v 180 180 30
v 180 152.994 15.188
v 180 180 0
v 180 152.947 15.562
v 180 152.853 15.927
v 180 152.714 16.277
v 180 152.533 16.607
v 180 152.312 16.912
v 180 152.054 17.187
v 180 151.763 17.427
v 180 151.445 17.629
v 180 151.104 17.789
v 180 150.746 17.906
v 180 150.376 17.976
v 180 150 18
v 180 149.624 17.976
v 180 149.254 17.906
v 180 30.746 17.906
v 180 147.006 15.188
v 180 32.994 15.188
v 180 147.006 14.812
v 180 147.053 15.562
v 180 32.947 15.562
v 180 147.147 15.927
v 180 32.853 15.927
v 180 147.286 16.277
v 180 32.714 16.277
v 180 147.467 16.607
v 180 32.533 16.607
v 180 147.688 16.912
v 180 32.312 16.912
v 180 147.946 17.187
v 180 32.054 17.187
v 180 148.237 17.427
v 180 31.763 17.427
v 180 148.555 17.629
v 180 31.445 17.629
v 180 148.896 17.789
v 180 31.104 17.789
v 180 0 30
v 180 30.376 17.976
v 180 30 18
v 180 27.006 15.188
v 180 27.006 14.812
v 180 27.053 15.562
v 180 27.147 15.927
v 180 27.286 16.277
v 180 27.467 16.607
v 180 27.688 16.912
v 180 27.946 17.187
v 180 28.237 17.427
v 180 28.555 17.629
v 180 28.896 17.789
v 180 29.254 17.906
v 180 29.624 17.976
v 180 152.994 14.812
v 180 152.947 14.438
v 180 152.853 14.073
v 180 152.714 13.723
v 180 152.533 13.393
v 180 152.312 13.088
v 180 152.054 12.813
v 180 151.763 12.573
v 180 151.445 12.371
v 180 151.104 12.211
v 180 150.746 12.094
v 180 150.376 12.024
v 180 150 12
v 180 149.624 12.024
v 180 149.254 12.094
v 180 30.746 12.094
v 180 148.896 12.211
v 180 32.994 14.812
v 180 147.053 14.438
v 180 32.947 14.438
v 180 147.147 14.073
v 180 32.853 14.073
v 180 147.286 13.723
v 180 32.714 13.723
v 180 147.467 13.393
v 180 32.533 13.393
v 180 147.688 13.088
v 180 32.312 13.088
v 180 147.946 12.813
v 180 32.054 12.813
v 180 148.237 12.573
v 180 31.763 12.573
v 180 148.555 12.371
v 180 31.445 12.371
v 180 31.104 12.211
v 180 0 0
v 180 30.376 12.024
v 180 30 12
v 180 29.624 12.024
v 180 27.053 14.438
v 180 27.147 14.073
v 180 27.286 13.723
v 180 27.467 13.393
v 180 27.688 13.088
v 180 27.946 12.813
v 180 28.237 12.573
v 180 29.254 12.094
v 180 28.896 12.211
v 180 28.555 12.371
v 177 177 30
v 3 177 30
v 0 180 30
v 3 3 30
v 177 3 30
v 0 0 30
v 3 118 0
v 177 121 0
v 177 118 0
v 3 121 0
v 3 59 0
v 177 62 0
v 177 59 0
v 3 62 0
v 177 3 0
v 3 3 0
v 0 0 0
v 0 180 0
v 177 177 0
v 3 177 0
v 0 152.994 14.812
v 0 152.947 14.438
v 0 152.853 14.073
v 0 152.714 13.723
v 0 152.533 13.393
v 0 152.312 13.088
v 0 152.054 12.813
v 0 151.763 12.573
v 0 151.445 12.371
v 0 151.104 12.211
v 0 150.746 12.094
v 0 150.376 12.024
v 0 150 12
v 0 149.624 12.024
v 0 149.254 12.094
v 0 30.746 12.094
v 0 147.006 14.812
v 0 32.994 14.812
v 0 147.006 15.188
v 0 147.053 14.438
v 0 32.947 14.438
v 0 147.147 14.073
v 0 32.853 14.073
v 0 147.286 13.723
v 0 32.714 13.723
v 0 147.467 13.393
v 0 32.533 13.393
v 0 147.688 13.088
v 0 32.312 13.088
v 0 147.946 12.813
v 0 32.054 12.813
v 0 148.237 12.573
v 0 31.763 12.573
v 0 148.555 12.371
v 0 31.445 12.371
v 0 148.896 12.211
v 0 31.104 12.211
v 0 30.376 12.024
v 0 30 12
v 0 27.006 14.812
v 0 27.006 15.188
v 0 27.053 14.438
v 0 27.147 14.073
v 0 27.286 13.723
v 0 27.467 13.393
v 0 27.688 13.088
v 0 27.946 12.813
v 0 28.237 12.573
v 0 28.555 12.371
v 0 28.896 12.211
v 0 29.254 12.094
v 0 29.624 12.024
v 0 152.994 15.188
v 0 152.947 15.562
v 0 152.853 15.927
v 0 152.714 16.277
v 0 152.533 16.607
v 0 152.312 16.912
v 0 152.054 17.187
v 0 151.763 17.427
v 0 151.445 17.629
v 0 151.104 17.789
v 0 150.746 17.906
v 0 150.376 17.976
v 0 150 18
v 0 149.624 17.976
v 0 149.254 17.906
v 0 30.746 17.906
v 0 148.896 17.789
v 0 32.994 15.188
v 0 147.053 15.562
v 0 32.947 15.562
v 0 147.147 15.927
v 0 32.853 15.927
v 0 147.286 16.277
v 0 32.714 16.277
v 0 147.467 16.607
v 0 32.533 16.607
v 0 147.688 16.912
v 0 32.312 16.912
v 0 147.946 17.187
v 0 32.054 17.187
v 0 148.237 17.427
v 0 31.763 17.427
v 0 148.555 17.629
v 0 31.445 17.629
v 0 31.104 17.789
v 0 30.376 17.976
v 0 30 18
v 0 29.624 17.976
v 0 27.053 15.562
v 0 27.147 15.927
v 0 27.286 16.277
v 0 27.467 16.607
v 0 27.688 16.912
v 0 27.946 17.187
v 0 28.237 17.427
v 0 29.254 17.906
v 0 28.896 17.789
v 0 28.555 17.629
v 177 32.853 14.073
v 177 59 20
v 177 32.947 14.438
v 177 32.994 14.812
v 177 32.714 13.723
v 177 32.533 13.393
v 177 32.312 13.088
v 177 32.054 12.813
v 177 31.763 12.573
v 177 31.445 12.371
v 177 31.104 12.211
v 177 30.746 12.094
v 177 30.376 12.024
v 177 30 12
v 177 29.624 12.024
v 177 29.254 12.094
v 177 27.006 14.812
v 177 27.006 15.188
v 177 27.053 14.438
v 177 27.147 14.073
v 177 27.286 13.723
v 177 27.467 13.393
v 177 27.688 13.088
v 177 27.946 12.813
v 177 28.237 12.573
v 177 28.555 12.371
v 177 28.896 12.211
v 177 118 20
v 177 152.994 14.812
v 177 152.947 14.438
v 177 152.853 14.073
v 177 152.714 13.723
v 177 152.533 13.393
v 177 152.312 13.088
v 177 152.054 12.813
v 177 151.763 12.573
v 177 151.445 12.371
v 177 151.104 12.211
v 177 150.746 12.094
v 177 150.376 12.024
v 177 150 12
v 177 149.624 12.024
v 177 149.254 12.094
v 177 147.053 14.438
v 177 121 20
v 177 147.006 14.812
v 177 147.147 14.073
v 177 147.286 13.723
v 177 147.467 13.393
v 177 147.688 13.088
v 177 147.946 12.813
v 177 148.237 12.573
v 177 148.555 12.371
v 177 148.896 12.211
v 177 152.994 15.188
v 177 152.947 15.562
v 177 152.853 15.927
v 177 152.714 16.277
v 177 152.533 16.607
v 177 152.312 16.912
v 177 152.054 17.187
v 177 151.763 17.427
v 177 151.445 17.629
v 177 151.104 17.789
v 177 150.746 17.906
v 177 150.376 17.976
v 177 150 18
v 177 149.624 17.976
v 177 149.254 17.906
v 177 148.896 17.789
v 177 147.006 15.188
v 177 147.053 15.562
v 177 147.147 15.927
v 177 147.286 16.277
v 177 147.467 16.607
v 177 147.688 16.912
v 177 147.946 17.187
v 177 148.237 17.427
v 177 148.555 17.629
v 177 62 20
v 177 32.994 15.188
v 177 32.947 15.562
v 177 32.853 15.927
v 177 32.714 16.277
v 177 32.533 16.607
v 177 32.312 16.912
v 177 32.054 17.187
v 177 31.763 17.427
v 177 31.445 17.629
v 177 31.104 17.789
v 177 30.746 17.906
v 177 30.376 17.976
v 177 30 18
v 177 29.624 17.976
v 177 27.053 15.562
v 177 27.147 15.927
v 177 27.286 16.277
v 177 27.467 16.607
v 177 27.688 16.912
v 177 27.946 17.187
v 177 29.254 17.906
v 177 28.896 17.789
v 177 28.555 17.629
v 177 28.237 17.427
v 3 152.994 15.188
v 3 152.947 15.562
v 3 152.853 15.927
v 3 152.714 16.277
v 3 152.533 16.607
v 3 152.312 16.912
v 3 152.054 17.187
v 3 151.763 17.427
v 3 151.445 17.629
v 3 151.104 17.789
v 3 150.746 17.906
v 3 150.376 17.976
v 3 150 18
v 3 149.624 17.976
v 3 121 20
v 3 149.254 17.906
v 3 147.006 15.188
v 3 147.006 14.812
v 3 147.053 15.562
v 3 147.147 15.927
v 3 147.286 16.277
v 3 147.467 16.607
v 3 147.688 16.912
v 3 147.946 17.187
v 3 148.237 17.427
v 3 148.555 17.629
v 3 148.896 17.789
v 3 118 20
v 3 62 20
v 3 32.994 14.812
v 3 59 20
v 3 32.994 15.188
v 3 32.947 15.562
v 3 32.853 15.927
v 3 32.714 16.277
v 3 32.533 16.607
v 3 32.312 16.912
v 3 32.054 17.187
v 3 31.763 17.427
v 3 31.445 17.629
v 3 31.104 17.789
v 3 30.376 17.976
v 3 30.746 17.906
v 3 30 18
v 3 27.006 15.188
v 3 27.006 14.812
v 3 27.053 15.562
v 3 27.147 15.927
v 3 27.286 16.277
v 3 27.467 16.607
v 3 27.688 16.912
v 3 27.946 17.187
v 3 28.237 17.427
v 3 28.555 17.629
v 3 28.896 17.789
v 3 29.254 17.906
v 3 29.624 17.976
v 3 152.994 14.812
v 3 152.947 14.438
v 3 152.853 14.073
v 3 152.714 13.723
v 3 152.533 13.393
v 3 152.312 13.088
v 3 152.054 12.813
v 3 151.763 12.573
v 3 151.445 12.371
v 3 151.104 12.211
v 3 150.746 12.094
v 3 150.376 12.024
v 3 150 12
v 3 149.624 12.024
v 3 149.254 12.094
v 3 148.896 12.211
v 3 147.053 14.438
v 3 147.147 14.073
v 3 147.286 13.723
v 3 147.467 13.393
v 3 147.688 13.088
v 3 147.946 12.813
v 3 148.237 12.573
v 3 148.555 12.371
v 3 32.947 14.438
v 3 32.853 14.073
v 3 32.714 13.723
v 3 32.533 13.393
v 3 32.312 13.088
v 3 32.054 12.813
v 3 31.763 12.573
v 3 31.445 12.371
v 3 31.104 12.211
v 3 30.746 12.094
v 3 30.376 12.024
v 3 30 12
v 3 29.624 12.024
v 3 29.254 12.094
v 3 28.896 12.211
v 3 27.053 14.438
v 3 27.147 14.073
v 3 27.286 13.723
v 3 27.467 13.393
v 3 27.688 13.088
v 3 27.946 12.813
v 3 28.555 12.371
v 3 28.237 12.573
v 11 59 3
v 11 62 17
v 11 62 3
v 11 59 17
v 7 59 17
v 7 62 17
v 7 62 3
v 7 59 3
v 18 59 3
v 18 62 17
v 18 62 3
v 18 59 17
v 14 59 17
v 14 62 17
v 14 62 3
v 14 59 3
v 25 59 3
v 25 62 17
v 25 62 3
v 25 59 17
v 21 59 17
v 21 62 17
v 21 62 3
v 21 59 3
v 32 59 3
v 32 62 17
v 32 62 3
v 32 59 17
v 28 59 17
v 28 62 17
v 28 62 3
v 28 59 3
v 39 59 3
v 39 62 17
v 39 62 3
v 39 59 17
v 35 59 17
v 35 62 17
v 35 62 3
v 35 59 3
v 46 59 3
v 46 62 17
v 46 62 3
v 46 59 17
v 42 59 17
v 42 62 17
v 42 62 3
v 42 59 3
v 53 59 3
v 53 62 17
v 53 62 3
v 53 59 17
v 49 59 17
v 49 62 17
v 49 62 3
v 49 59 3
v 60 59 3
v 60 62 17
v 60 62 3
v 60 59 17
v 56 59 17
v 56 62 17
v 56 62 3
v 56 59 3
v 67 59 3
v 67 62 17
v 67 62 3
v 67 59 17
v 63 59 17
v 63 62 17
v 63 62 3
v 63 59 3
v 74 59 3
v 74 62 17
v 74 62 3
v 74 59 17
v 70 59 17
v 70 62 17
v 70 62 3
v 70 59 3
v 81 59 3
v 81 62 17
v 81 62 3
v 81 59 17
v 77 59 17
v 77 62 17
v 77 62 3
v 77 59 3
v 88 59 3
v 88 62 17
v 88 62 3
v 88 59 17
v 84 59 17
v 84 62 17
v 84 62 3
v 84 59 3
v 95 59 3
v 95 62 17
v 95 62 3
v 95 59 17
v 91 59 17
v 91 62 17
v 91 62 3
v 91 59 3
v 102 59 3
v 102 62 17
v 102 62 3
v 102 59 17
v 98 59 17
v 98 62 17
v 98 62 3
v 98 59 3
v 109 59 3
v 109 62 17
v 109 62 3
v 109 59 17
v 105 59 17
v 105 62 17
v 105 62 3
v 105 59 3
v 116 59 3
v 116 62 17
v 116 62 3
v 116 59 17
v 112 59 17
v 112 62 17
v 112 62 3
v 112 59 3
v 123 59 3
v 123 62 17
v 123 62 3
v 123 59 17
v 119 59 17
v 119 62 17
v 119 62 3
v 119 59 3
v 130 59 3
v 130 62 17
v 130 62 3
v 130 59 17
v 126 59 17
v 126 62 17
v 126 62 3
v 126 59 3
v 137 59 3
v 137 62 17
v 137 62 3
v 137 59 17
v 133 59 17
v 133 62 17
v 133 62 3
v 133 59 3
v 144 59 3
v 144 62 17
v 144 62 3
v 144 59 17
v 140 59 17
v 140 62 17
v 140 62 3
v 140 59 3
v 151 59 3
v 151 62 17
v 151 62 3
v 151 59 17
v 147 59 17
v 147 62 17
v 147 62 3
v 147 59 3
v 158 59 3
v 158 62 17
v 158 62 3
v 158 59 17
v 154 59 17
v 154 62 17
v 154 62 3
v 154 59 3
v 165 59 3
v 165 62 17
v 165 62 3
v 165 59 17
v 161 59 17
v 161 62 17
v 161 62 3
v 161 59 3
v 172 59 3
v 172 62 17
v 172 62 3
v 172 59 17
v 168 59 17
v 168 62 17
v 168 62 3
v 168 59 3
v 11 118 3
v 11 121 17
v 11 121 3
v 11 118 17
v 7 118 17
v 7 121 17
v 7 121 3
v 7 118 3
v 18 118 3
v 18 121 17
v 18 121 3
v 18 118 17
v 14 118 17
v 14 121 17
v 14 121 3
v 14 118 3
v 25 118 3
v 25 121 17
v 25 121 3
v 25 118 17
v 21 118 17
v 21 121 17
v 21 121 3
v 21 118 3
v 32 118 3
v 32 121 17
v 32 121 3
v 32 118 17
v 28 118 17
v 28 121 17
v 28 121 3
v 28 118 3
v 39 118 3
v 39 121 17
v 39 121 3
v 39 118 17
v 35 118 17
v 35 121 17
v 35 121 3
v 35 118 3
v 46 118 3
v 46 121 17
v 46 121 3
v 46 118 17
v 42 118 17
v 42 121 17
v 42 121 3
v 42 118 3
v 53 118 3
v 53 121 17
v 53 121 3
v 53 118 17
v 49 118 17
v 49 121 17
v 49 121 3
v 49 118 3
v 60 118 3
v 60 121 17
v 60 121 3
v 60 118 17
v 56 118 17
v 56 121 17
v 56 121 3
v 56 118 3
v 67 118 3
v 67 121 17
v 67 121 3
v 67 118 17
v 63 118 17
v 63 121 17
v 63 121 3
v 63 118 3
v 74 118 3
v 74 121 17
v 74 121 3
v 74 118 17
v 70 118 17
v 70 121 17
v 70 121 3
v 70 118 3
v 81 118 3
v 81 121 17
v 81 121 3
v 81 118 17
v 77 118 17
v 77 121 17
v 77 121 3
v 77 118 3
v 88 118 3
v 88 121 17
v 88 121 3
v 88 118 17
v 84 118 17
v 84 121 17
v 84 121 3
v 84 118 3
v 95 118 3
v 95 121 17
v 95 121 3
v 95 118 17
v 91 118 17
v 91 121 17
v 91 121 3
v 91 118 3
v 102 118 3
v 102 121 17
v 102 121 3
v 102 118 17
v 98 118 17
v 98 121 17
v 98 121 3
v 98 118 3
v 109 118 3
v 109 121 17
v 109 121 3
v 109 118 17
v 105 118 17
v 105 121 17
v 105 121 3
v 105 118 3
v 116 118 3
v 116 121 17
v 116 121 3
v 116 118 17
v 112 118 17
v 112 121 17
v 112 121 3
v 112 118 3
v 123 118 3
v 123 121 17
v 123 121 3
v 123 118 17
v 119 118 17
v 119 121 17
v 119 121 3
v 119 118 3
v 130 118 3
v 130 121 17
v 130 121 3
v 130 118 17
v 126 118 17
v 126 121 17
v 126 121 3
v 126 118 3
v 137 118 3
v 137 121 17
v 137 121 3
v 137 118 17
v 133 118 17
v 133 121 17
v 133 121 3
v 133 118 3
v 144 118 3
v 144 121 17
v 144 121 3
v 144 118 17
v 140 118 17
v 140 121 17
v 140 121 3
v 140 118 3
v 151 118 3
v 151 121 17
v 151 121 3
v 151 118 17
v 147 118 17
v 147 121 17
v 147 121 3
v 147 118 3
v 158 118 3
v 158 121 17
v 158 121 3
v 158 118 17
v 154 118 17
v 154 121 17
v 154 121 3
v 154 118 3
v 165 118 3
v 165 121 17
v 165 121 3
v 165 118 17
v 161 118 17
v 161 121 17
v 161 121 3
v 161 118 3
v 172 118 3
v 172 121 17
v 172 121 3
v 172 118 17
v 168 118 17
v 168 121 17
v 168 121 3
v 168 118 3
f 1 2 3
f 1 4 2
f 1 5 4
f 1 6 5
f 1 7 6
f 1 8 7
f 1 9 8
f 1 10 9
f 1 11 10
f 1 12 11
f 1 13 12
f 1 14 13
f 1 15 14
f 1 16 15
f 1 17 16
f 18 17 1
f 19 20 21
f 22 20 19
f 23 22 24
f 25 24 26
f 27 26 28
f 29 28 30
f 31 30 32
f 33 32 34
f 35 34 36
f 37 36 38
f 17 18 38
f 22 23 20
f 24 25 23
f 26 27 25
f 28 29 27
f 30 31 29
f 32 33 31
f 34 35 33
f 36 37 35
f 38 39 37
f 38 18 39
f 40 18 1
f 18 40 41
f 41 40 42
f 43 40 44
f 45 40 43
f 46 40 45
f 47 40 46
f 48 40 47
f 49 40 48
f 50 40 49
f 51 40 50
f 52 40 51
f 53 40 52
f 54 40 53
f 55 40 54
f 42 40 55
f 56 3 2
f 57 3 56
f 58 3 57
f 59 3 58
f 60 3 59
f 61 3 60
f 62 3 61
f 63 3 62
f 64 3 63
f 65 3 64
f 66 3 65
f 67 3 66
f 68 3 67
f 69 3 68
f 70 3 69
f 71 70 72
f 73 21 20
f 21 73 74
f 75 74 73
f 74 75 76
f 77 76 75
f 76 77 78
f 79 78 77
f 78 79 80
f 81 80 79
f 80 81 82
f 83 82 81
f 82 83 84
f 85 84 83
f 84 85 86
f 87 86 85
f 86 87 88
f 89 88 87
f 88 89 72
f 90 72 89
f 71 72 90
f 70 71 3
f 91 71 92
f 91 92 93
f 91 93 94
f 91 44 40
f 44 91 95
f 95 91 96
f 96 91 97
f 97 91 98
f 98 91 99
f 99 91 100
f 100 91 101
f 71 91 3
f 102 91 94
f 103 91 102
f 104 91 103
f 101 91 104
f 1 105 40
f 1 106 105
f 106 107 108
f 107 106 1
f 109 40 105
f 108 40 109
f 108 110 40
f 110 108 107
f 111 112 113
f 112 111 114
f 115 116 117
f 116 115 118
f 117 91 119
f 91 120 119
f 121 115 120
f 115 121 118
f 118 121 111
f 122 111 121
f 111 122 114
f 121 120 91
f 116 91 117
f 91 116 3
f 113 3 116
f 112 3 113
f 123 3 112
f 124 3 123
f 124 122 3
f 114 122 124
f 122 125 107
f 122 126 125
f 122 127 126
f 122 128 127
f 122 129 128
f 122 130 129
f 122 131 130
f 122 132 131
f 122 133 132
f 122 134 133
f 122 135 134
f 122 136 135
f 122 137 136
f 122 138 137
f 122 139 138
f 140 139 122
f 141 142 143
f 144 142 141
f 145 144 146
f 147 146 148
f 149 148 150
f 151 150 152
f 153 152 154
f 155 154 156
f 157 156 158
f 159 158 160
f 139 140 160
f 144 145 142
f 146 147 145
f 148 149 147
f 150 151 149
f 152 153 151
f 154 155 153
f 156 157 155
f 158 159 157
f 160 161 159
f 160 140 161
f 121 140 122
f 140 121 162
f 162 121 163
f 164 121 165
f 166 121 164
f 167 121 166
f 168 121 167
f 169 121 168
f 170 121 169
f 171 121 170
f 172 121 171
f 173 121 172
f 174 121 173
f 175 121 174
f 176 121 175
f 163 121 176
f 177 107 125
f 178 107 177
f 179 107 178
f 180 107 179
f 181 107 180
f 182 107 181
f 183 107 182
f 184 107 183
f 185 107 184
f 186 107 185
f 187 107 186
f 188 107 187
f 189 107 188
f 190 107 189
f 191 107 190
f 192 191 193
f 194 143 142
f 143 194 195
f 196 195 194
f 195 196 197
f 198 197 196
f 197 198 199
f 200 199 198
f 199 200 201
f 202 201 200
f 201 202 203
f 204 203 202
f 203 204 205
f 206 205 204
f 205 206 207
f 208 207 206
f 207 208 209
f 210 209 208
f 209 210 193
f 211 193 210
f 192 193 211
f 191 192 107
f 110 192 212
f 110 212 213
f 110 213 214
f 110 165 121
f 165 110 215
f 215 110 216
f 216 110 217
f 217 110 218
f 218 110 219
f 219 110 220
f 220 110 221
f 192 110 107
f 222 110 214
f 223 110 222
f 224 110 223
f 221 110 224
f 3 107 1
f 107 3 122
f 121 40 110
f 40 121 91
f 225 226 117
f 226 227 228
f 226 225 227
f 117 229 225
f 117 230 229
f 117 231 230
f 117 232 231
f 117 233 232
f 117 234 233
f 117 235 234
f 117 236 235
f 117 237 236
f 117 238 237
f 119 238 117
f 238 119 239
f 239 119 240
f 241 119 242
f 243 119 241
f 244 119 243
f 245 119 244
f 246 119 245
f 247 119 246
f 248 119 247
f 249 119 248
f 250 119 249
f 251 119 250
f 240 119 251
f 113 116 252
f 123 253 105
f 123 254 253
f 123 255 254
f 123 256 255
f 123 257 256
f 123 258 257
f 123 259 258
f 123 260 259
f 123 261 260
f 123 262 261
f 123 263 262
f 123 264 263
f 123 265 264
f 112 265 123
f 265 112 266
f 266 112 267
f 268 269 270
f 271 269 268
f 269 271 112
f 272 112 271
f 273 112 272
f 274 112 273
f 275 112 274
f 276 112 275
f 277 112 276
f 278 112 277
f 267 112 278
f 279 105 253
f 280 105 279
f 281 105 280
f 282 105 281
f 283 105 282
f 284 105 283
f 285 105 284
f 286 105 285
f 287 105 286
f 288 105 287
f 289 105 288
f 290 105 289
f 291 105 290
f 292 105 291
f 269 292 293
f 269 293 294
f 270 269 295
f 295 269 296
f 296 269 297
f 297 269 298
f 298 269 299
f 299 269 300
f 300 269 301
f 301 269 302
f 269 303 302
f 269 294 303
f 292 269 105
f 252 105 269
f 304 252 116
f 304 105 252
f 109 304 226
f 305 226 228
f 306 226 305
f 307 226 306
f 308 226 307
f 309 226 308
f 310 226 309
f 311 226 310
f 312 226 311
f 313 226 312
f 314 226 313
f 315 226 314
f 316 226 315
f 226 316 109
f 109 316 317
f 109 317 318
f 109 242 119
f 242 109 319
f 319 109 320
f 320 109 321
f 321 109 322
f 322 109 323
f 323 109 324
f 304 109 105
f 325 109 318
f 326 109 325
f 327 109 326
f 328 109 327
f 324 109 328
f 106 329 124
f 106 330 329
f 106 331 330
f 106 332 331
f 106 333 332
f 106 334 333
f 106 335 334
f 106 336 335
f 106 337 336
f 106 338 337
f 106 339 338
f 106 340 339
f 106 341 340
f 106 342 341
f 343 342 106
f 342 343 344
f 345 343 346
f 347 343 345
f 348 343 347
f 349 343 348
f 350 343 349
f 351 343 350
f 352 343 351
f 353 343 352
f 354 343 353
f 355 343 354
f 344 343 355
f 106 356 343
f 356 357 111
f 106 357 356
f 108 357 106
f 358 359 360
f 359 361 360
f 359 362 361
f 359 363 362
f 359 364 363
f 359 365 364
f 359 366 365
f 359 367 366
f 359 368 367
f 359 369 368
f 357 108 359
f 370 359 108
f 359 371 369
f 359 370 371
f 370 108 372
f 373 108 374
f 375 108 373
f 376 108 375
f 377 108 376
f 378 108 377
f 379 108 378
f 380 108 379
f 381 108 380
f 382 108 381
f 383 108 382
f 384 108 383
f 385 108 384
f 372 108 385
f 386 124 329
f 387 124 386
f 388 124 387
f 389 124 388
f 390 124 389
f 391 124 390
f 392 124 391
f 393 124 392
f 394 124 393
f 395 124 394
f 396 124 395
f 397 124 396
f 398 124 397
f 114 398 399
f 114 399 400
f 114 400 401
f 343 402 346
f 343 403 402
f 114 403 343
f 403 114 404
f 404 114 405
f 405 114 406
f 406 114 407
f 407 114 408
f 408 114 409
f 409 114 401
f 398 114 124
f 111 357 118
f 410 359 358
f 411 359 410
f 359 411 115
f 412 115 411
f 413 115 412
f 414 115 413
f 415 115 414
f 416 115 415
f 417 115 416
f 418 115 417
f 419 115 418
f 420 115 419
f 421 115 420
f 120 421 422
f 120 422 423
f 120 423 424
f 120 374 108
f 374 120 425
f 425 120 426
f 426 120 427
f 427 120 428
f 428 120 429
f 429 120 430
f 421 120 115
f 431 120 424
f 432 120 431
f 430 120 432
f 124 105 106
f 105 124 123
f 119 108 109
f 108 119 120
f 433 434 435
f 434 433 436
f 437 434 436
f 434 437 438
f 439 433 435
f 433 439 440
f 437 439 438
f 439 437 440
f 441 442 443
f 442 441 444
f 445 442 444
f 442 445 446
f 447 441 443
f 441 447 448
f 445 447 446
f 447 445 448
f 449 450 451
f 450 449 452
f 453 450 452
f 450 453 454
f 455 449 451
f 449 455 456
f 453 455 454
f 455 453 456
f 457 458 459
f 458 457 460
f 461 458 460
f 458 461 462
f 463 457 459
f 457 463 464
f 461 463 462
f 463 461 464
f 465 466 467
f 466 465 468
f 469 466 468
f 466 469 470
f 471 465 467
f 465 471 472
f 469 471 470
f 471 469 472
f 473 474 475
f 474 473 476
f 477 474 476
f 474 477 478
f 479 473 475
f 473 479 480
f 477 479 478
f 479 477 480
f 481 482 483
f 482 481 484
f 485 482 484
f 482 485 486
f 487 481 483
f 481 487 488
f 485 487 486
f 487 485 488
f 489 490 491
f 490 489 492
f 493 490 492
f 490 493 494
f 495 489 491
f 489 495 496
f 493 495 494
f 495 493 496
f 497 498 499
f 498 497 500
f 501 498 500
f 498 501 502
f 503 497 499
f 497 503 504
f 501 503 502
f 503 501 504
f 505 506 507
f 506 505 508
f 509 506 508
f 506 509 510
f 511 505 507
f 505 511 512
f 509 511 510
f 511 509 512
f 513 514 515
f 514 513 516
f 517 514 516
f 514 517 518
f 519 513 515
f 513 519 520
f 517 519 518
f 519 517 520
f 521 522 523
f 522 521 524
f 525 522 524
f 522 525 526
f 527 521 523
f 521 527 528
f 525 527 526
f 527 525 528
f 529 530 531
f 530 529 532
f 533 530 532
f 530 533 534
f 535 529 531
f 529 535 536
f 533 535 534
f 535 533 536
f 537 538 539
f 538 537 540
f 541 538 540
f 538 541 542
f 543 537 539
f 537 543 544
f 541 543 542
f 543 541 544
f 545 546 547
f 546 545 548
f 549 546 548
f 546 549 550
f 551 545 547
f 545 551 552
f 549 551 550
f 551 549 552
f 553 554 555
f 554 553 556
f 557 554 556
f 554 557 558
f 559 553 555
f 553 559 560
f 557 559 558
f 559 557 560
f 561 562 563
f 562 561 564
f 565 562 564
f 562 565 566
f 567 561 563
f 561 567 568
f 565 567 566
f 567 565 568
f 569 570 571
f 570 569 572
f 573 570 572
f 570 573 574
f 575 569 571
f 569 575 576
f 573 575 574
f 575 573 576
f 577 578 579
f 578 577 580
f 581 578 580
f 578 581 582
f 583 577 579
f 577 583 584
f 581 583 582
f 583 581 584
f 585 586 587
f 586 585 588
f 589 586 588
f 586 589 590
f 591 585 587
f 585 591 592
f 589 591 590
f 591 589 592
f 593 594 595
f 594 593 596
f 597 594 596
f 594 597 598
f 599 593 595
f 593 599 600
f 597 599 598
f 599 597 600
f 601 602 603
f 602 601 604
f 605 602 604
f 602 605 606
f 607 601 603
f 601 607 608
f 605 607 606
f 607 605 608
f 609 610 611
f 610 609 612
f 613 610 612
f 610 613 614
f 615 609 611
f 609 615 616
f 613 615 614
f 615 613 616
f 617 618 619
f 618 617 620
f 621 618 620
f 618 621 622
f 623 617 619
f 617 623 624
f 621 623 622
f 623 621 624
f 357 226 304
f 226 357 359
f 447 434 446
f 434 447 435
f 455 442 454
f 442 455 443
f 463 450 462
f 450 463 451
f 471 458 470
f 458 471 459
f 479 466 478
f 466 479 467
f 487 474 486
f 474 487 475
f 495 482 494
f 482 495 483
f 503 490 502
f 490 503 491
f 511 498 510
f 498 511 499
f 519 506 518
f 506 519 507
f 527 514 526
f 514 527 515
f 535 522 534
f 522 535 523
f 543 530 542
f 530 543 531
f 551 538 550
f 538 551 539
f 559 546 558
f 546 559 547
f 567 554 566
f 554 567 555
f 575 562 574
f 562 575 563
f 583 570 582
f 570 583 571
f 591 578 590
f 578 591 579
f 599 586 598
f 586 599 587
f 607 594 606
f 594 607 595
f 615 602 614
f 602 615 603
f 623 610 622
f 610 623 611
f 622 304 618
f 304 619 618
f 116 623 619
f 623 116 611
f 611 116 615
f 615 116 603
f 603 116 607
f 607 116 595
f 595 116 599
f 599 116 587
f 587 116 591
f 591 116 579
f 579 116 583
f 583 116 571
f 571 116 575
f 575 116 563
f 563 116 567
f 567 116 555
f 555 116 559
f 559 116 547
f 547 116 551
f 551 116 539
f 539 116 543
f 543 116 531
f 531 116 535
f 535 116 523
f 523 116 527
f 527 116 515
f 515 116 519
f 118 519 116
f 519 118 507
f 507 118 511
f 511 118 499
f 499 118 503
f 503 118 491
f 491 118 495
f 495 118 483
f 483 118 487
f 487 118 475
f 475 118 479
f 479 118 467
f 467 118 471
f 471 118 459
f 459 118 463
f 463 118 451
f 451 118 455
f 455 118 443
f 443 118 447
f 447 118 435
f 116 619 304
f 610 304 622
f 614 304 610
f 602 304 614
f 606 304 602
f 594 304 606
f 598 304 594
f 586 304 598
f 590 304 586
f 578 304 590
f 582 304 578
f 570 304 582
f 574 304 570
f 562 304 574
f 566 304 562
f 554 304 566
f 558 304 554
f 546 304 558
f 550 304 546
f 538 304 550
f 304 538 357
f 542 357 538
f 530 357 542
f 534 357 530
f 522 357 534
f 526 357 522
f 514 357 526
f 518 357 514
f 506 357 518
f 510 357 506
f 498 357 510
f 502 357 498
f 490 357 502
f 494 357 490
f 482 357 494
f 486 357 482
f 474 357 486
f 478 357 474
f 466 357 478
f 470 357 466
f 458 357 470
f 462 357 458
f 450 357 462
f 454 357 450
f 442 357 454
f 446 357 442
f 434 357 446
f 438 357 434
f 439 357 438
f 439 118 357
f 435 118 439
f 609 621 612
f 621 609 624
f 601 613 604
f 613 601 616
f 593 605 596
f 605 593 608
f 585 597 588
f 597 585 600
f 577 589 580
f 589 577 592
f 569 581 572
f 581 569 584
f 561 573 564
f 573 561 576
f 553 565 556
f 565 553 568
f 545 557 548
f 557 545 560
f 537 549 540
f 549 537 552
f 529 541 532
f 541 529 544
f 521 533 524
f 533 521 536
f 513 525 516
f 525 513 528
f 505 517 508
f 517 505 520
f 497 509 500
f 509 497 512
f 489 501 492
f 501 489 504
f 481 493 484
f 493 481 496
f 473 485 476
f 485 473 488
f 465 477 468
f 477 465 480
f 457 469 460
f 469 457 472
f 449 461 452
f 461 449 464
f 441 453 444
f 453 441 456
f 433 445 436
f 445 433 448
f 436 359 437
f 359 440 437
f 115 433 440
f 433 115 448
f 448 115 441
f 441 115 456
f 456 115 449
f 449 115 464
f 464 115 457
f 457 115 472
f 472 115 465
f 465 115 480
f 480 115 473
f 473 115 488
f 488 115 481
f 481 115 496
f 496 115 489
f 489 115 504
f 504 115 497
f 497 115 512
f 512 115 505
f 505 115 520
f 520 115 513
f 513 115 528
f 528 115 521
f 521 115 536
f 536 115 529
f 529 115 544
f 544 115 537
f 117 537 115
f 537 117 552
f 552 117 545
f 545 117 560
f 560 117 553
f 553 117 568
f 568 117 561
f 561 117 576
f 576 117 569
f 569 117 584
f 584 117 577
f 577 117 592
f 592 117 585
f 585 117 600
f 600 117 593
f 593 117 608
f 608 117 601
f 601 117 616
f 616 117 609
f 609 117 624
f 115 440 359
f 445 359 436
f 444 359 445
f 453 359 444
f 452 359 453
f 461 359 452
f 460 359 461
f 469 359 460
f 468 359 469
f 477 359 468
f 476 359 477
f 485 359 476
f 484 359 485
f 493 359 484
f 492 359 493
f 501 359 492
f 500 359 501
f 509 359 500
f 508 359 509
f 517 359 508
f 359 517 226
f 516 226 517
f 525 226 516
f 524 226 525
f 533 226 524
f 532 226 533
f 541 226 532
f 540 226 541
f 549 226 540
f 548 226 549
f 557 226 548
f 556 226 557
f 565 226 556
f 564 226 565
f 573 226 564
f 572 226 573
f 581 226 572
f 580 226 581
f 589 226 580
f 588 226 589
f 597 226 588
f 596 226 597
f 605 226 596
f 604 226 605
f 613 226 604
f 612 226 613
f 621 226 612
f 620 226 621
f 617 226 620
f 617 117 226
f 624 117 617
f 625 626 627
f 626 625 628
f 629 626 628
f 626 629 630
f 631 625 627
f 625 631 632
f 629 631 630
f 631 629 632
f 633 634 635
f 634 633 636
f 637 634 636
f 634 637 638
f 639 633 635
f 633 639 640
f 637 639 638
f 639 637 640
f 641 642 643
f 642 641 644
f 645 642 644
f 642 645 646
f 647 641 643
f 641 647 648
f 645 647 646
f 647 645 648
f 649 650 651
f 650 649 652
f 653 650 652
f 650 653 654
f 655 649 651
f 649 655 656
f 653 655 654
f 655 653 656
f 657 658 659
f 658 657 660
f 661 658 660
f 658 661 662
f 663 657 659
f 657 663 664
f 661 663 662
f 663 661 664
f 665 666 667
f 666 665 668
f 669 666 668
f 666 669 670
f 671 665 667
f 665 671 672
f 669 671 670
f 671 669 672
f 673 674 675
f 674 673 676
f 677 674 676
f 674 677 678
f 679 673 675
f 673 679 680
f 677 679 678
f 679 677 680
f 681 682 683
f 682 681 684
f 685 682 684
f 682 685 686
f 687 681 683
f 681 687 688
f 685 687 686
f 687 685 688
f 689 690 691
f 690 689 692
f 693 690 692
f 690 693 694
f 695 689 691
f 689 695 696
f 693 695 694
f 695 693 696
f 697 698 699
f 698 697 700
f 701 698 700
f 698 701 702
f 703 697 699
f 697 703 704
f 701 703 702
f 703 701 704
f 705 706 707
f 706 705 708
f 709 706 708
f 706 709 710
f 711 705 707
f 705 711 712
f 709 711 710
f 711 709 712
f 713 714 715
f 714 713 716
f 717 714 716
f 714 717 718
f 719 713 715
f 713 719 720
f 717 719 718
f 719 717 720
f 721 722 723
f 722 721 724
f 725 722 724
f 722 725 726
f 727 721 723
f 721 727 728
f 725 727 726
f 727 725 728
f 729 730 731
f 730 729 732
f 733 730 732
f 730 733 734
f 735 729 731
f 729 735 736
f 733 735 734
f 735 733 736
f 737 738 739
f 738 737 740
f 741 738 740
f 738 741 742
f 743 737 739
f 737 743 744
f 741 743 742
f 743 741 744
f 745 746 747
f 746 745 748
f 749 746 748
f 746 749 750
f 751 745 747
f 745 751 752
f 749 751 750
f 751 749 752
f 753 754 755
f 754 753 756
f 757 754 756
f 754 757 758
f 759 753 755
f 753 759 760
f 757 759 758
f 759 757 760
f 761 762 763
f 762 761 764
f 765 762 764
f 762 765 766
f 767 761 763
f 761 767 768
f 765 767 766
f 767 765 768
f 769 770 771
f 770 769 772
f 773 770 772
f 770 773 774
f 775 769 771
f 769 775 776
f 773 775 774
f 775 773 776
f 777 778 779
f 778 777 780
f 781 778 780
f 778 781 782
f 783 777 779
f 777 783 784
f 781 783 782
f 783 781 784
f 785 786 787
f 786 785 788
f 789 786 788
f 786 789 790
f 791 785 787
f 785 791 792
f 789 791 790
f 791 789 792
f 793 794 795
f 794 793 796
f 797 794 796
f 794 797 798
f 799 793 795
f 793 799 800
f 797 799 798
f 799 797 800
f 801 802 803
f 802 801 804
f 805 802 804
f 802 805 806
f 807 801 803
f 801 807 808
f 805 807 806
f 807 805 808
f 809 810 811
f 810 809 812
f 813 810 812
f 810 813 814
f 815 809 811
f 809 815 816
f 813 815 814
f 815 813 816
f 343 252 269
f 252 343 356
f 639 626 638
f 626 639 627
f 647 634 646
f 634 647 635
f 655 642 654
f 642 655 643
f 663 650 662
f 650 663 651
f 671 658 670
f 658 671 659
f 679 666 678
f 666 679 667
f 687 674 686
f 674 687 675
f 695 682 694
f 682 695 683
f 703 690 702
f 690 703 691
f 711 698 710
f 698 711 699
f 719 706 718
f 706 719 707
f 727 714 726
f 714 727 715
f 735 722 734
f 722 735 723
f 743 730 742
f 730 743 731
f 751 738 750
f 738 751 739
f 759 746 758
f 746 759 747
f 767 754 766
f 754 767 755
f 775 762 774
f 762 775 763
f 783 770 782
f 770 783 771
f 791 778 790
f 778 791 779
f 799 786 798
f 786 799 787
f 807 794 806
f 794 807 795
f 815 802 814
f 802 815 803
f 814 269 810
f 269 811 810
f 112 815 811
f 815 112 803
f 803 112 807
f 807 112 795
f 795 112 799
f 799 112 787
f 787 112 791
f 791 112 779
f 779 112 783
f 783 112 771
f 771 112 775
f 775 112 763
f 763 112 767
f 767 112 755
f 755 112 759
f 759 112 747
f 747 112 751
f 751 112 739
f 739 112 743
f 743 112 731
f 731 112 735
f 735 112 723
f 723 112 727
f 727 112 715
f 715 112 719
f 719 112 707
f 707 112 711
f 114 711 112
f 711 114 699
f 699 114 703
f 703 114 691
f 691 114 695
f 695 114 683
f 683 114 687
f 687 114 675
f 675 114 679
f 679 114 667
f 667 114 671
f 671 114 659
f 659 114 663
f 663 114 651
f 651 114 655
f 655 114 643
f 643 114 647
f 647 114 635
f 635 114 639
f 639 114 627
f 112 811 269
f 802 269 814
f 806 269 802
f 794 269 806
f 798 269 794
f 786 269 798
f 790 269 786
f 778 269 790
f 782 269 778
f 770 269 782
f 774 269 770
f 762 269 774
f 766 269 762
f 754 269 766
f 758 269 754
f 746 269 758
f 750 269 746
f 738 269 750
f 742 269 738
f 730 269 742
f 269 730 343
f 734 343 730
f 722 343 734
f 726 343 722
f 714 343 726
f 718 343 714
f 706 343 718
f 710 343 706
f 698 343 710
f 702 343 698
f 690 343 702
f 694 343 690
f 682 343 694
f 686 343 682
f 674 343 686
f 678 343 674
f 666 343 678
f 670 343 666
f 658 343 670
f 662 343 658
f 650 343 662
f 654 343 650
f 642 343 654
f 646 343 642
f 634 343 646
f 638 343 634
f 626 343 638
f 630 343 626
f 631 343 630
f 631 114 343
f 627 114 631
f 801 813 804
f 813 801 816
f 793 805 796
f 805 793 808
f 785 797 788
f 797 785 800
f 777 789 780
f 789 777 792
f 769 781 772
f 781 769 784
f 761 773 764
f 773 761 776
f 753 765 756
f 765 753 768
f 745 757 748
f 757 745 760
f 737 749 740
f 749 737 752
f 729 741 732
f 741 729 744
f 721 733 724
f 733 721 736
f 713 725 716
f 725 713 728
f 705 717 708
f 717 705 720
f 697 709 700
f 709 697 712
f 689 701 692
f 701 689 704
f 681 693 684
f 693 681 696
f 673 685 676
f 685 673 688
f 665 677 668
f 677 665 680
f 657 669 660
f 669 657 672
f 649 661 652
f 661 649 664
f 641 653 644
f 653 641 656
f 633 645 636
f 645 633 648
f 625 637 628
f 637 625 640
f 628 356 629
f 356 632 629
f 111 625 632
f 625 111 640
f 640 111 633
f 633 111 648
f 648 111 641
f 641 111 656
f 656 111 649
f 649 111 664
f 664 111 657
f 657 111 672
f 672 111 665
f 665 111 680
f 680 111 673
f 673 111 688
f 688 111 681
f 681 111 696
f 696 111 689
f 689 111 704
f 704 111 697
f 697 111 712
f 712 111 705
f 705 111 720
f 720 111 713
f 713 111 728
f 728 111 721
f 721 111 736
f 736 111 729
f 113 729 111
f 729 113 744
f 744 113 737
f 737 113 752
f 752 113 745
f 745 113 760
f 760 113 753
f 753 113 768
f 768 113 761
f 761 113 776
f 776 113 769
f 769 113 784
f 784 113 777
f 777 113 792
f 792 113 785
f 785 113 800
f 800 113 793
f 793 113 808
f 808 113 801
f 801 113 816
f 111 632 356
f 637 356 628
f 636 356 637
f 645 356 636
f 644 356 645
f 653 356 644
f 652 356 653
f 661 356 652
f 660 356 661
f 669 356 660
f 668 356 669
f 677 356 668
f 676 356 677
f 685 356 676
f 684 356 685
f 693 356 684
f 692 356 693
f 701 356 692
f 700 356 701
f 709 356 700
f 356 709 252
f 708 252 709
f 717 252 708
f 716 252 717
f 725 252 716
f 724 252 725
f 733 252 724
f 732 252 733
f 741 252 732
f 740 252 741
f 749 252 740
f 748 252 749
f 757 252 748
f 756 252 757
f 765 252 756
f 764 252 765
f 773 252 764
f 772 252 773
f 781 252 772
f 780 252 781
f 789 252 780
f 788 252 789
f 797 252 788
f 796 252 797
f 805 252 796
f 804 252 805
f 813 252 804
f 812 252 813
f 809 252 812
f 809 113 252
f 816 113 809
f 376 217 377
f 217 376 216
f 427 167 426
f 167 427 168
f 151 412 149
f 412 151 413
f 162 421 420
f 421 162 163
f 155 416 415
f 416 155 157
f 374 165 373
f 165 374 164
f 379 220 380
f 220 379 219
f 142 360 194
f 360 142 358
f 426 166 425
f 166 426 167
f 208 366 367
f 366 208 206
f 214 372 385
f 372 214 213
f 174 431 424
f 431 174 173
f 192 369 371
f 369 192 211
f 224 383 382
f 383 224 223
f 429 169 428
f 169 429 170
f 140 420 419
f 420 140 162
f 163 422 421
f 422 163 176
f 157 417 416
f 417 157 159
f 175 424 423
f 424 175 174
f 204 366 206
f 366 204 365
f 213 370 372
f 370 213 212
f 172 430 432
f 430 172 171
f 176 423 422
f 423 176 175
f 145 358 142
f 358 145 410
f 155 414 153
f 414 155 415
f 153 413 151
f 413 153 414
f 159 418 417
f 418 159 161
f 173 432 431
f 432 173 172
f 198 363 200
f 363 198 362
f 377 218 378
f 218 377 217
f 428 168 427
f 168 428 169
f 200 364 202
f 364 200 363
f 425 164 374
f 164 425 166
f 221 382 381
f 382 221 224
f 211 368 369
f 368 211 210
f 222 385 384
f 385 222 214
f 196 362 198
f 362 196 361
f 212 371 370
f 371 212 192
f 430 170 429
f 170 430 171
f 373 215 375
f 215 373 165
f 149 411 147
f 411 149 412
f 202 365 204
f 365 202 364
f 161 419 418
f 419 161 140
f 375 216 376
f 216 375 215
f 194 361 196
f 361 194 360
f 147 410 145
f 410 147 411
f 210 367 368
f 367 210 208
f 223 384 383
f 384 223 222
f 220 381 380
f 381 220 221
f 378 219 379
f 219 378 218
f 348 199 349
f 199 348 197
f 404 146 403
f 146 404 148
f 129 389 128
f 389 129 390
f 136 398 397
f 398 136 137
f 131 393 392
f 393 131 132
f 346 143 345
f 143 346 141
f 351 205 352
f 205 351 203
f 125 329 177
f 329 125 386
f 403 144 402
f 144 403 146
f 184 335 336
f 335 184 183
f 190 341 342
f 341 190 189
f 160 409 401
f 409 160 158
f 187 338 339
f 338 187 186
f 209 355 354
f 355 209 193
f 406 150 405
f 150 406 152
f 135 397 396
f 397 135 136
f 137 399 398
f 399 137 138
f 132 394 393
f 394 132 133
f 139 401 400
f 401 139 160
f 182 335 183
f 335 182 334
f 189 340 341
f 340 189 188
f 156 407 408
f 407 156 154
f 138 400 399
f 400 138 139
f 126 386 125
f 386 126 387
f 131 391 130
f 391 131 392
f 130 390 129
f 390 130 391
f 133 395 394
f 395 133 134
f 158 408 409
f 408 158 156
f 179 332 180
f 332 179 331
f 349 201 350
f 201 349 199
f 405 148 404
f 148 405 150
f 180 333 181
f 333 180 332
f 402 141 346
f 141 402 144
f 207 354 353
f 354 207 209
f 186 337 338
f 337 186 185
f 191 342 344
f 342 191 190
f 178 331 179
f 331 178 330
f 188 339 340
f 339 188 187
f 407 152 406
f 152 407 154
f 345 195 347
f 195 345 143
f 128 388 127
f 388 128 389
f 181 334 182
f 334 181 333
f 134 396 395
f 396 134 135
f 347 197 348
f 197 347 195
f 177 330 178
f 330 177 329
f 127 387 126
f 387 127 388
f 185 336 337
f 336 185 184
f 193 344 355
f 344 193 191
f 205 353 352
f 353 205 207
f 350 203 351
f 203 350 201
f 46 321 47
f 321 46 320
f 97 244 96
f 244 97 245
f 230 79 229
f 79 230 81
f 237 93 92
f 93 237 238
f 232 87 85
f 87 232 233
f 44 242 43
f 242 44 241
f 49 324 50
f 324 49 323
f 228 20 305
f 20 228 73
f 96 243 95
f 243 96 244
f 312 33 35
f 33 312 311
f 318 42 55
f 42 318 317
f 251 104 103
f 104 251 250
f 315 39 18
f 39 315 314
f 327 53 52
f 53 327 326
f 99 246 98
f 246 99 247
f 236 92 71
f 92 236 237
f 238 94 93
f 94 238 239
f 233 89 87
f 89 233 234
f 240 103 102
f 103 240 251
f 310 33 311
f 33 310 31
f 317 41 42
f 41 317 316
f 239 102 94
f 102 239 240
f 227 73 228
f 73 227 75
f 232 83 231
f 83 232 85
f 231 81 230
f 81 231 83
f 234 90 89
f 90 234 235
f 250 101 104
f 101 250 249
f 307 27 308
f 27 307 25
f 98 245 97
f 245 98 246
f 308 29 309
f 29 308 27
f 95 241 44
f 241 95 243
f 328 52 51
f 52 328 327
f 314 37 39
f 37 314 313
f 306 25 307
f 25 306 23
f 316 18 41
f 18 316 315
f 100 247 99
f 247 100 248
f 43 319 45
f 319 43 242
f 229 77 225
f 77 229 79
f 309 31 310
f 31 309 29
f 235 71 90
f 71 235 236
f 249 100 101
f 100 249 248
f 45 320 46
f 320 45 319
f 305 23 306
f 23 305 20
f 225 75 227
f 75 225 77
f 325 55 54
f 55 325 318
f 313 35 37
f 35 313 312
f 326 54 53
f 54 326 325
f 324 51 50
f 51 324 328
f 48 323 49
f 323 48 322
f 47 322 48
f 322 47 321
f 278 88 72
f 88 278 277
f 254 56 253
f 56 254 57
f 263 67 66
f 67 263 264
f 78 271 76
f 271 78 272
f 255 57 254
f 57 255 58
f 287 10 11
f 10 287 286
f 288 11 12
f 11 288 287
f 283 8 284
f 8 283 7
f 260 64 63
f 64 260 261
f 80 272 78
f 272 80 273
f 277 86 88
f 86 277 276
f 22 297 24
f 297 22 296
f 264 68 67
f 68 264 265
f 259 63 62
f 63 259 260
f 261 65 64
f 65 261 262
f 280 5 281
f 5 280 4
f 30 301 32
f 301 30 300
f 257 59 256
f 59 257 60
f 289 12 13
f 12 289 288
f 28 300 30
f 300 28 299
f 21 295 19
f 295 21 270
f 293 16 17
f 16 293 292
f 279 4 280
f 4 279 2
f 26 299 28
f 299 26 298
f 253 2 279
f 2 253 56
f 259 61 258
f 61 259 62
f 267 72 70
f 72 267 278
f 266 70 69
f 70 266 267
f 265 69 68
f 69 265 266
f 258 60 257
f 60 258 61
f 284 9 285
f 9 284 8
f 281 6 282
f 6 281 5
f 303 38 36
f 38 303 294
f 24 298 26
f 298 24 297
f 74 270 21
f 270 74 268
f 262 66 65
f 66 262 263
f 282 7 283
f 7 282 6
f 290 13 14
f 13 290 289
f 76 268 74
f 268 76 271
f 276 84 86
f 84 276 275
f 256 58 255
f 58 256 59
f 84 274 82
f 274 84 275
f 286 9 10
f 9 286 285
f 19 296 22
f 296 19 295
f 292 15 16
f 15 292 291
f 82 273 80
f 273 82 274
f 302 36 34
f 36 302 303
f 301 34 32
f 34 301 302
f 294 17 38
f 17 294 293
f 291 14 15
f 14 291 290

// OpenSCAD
// Daniel Seijas Iglesias <seijasdeveloper@gmail.com>
// Pataforma

$fn = 50;

largo = 180;
alto = 30;
grosor = 3;
coeficiente_altura = 10;

h_largo = 4;

r_rueda = 3;

difference(){
    union(){
        
        // Exterior
        difference(){
            cube([largo, largo, alto]);
            
            translate([grosor, grosor, -0.05])
                cube([largo-grosor*2, largo-grosor*2, alto+0.1]);
        }
        
        // longitudinales
        for(i = [1:2]){
            translate([0, (largo-grosor)/3*i, 0])
                difference(){
                    cube([largo, grosor, alto-coeficiente_altura]);
                    
                    for(j = [1:24]){
                        translate([(h_largo+grosor)*j, -0.05, grosor])
                            cube([h_largo, grosor+0.1, alto-coeficiente_altura-grosor*2]);
                    }
                }
        }
    }
    
    // hueco motor a1
    translate([-0.05, largo/6, alto/2])
        rotate([0, 90, 0])
            cylinder(r=r_rueda, h=grosor+0.1);
    
    // hueco motor a2
    translate([-0.05, largo/6*5, alto/2])
        rotate([0, 90, 0])
            cylinder(r=r_rueda, h=grosor+0.1);
    
    // hueco motor b1
    translate([largo-grosor-0.05, largo/6, alto/2])
        rotate([0, 90, 0])
            cylinder(r=r_rueda, h=grosor+0.1);
    
    // hueco motor b2
    translate([largo-grosor-0.05, largo/6*5, alto/2])
        rotate([0, 90, 0])
            cylinder(r=r_rueda, h=grosor+0.1);
}
